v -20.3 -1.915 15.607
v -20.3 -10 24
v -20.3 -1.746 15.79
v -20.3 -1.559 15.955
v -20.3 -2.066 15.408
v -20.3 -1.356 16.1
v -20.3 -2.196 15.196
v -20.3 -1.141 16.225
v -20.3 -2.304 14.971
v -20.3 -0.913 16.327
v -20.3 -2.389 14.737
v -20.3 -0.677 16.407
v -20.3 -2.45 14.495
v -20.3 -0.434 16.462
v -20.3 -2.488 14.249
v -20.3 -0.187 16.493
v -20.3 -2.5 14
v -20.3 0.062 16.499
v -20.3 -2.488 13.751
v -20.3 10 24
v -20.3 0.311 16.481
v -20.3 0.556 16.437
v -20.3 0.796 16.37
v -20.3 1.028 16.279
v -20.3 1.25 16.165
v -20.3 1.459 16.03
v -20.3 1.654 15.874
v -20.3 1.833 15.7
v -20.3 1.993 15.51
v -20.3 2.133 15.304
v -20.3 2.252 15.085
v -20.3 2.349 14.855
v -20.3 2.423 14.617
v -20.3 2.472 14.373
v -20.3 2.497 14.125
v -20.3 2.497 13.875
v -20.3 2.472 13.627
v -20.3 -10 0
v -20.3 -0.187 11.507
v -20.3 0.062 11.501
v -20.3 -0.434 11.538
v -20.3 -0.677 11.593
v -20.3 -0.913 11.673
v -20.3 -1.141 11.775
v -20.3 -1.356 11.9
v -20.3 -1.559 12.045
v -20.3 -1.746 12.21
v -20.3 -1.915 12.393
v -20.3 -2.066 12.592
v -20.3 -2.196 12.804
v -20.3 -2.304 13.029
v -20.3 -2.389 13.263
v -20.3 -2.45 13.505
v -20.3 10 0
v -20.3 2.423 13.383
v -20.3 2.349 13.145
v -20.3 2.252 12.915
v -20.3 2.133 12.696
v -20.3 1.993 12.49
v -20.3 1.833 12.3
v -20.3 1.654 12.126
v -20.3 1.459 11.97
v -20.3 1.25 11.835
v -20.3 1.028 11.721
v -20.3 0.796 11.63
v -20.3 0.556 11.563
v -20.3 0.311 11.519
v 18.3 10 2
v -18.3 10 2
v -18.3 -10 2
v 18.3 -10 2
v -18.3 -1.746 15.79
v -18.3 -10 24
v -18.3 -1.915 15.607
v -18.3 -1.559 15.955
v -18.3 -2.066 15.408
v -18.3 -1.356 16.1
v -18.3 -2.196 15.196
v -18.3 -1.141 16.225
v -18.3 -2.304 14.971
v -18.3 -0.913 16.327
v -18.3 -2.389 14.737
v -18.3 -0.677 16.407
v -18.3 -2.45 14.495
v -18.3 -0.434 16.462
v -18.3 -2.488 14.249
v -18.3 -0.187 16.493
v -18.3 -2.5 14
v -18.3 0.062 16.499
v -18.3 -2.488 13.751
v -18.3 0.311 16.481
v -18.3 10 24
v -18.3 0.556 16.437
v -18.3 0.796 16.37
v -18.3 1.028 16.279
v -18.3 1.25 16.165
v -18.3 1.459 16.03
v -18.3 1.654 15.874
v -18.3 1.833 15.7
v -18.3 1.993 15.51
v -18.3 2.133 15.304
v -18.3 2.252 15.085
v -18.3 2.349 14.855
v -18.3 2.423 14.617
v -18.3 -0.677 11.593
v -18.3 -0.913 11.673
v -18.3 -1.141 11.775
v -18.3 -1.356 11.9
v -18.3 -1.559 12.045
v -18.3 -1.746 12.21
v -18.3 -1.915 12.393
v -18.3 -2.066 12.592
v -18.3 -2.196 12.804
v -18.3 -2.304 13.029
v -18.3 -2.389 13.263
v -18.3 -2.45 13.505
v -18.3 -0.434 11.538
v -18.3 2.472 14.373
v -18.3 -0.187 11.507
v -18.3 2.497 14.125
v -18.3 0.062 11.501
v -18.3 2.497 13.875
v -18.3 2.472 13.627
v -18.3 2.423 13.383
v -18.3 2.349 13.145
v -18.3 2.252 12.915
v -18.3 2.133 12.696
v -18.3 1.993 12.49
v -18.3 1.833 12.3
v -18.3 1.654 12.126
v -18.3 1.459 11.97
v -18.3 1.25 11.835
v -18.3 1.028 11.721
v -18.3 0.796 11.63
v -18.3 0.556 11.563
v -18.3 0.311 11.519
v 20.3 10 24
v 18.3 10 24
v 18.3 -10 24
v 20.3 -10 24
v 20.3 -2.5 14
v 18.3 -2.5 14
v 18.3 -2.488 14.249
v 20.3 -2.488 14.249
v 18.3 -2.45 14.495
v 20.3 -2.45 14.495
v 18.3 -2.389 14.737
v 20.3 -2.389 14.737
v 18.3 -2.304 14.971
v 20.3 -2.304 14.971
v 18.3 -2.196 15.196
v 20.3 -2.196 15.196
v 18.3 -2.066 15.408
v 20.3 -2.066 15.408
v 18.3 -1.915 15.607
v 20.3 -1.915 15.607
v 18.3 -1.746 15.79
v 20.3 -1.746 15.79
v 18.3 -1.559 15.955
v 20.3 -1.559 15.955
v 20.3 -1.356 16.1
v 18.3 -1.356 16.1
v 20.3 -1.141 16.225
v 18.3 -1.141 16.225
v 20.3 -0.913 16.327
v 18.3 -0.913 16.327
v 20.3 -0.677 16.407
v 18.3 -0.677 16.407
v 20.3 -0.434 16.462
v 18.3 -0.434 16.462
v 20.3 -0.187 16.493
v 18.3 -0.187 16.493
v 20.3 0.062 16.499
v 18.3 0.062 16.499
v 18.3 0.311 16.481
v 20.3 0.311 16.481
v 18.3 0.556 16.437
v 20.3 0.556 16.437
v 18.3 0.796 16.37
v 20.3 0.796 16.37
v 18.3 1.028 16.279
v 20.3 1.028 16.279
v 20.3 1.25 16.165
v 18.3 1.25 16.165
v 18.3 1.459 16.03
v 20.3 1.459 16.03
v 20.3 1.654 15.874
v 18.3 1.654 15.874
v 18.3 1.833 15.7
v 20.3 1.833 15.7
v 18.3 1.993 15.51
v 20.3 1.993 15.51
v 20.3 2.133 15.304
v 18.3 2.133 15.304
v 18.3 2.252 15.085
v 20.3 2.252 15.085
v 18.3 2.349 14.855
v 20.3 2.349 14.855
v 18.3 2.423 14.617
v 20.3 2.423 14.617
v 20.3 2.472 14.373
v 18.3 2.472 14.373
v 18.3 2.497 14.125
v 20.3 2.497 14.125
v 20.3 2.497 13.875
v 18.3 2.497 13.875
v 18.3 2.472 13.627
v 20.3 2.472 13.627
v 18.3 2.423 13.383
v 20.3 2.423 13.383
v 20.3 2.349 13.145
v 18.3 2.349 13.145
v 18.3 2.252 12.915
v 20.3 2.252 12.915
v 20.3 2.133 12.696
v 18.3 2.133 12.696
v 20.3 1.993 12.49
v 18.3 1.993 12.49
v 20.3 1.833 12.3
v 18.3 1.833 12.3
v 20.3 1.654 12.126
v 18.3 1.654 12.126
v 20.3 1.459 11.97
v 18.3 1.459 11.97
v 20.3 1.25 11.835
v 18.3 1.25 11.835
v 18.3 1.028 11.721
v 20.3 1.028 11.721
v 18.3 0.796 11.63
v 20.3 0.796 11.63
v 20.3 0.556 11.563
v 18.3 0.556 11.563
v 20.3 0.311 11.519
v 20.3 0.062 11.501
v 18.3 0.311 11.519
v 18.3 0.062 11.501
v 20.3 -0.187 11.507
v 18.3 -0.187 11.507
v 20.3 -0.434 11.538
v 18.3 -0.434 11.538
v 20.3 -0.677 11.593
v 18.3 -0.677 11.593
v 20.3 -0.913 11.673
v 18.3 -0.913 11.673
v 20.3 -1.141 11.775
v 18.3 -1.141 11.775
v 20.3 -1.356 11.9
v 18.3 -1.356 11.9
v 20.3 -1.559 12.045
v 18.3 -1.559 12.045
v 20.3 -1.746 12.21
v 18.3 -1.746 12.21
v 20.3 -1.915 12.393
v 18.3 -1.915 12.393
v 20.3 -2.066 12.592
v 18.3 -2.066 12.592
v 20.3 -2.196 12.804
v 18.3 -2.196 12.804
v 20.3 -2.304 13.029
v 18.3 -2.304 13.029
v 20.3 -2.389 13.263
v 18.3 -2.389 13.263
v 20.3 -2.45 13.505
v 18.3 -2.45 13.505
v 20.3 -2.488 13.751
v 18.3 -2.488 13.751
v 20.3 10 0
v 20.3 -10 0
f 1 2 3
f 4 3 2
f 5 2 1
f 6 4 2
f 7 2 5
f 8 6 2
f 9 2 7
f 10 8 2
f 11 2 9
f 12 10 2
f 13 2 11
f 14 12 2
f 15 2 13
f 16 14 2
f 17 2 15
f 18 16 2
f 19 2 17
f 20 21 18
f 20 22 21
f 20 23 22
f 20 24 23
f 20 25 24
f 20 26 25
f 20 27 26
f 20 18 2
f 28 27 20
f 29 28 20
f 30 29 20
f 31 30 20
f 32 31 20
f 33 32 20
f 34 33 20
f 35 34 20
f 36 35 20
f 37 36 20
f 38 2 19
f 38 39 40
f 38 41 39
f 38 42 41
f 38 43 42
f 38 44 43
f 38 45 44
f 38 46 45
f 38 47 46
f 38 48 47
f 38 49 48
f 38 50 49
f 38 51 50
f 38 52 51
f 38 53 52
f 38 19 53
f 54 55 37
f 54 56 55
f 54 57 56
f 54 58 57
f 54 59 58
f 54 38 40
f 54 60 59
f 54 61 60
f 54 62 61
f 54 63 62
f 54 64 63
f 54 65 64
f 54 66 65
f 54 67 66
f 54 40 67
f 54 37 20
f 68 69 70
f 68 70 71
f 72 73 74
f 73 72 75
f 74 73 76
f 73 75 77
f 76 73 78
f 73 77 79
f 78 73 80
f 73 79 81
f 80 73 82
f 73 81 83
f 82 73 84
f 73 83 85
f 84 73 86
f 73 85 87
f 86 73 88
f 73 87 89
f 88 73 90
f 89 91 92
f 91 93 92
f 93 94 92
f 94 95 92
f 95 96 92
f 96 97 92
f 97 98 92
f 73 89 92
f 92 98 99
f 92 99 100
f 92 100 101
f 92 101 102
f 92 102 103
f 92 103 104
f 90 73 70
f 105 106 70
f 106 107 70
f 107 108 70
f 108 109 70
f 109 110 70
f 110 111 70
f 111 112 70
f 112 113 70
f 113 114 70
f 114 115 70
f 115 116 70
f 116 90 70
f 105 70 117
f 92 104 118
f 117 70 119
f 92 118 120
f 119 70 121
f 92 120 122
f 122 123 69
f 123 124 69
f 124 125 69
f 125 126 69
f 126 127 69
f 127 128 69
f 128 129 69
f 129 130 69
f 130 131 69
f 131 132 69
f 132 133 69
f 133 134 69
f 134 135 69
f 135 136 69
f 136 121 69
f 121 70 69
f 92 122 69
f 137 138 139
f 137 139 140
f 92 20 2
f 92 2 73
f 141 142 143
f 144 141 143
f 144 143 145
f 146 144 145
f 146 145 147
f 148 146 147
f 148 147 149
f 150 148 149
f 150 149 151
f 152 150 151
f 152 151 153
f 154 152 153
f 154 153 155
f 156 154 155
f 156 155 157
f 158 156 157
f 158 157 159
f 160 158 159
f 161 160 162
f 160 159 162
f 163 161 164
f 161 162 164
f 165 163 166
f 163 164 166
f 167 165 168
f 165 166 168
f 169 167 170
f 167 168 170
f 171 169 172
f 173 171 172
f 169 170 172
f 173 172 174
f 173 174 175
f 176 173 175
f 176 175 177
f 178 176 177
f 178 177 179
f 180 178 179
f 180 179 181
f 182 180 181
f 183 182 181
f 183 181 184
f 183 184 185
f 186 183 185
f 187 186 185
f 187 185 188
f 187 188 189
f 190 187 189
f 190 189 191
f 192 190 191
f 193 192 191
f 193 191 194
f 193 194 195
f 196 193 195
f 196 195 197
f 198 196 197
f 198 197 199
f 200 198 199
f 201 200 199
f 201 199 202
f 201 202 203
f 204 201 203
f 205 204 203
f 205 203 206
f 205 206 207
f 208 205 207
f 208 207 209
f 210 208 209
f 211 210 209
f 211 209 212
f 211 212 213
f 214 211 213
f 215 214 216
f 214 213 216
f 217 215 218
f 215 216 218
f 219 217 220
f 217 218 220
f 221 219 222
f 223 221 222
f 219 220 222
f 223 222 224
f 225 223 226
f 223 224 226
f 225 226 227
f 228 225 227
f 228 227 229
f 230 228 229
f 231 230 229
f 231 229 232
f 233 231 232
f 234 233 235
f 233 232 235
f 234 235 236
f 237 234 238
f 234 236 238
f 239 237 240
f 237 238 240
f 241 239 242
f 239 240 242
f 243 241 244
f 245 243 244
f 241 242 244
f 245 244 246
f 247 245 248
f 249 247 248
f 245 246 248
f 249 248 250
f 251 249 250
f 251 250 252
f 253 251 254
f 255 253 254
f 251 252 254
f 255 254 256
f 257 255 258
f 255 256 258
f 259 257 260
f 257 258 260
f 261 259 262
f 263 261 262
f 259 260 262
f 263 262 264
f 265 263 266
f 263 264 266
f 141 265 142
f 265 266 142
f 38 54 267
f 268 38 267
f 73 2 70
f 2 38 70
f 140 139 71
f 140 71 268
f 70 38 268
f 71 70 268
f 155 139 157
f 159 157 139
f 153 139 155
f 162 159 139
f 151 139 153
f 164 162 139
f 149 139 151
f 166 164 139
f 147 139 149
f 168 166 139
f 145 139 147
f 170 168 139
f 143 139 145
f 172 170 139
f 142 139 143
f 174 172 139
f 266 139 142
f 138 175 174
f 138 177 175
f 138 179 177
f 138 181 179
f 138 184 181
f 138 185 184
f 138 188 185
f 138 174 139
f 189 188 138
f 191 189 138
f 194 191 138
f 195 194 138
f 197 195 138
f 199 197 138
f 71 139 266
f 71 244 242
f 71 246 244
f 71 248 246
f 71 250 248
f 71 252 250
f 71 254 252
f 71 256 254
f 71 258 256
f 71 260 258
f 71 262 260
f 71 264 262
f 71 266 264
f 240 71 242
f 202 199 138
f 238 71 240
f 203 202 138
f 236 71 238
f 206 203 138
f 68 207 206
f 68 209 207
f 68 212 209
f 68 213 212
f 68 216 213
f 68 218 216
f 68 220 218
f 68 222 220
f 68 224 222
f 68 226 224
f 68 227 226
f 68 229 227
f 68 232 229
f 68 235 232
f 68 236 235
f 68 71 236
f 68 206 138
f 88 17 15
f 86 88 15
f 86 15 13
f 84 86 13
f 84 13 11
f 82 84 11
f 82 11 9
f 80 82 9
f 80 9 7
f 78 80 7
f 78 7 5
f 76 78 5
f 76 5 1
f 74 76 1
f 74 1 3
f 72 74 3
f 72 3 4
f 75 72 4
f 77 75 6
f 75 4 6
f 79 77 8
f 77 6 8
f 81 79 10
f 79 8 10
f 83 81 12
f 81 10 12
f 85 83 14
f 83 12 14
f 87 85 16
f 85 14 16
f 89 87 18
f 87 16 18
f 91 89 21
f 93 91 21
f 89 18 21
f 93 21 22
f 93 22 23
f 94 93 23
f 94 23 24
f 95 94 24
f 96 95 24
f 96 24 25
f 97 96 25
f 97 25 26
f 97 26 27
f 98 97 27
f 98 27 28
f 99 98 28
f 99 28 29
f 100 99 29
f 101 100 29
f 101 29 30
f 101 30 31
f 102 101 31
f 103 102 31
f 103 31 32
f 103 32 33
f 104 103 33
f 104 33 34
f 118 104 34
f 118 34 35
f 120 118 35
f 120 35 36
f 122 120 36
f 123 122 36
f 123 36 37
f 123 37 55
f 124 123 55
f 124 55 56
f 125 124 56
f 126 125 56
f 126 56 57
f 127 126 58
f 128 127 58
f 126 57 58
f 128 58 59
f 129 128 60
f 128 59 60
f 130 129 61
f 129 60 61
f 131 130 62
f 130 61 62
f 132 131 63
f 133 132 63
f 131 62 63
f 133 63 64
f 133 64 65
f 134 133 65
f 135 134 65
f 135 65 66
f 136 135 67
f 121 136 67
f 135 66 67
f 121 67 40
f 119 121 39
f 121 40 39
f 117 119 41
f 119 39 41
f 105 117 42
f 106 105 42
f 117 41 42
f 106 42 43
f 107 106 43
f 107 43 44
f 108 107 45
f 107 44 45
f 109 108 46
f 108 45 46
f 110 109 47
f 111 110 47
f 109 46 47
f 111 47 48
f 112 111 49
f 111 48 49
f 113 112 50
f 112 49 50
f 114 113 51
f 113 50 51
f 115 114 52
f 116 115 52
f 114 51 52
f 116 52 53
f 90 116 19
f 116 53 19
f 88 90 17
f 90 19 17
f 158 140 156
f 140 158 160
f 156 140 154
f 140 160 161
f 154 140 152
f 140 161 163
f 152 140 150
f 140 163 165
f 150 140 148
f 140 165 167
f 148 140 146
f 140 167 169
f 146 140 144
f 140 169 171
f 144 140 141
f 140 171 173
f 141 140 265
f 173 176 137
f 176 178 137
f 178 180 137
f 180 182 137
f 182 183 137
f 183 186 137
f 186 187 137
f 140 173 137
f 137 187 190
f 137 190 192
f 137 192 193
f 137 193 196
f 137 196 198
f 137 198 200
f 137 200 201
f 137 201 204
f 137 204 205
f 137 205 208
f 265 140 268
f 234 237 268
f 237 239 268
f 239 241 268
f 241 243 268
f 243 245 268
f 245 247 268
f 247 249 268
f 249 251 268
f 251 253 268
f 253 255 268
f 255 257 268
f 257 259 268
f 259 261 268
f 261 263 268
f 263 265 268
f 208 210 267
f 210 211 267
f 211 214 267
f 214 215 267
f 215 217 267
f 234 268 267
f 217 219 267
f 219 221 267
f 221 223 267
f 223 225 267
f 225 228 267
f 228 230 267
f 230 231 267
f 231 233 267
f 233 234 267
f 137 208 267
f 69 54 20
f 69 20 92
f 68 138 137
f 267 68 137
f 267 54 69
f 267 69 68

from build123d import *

# Parameters (mm, degrees)
SKETCH_1_W          = 40.6
SKETCH_1_H          = 20
EXTRUDE_1_DEPTH     = 2
SKETCH_2_W          = 2
SKETCH_2_H          = 20
EXTRUDE_2_DEPTH     = 22
SKETCH_3_R          = 2.5
CUT_EXTRUDE_1_DEPTH = 49.211616857


with BuildPart() as part:
    # 草图1 → 凸台-拉伸1 (new body)
    with BuildSketch(Plane.XY):
        Rectangle(SKETCH_1_W, SKETCH_1_H)
    extrude(amount=EXTRUDE_1_DEPTH)

    # 草图2 → 凸台-拉伸2 (add)
    with BuildSketch(Plane.XY.offset(2)):
        with Locations((-19.3, 0)):
            Rectangle(SKETCH_2_W, SKETCH_2_H)
        with Locations((19.3, 0)):
            Rectangle(SKETCH_2_W, SKETCH_2_H)
    extrude(amount=EXTRUDE_2_DEPTH)

    # 草图3 → 切除-拉伸1 (cut, through all)
    with BuildSketch(Plane.ZY.offset(20.3)):
        with Locations(Location((14, 0, 0), (0, 0, 270))):
            Circle(SKETCH_3_R)
    extrude(amount=-CUT_EXTRUDE_1_DEPTH, mode=Mode.SUBTRACT)


solid = part.part
